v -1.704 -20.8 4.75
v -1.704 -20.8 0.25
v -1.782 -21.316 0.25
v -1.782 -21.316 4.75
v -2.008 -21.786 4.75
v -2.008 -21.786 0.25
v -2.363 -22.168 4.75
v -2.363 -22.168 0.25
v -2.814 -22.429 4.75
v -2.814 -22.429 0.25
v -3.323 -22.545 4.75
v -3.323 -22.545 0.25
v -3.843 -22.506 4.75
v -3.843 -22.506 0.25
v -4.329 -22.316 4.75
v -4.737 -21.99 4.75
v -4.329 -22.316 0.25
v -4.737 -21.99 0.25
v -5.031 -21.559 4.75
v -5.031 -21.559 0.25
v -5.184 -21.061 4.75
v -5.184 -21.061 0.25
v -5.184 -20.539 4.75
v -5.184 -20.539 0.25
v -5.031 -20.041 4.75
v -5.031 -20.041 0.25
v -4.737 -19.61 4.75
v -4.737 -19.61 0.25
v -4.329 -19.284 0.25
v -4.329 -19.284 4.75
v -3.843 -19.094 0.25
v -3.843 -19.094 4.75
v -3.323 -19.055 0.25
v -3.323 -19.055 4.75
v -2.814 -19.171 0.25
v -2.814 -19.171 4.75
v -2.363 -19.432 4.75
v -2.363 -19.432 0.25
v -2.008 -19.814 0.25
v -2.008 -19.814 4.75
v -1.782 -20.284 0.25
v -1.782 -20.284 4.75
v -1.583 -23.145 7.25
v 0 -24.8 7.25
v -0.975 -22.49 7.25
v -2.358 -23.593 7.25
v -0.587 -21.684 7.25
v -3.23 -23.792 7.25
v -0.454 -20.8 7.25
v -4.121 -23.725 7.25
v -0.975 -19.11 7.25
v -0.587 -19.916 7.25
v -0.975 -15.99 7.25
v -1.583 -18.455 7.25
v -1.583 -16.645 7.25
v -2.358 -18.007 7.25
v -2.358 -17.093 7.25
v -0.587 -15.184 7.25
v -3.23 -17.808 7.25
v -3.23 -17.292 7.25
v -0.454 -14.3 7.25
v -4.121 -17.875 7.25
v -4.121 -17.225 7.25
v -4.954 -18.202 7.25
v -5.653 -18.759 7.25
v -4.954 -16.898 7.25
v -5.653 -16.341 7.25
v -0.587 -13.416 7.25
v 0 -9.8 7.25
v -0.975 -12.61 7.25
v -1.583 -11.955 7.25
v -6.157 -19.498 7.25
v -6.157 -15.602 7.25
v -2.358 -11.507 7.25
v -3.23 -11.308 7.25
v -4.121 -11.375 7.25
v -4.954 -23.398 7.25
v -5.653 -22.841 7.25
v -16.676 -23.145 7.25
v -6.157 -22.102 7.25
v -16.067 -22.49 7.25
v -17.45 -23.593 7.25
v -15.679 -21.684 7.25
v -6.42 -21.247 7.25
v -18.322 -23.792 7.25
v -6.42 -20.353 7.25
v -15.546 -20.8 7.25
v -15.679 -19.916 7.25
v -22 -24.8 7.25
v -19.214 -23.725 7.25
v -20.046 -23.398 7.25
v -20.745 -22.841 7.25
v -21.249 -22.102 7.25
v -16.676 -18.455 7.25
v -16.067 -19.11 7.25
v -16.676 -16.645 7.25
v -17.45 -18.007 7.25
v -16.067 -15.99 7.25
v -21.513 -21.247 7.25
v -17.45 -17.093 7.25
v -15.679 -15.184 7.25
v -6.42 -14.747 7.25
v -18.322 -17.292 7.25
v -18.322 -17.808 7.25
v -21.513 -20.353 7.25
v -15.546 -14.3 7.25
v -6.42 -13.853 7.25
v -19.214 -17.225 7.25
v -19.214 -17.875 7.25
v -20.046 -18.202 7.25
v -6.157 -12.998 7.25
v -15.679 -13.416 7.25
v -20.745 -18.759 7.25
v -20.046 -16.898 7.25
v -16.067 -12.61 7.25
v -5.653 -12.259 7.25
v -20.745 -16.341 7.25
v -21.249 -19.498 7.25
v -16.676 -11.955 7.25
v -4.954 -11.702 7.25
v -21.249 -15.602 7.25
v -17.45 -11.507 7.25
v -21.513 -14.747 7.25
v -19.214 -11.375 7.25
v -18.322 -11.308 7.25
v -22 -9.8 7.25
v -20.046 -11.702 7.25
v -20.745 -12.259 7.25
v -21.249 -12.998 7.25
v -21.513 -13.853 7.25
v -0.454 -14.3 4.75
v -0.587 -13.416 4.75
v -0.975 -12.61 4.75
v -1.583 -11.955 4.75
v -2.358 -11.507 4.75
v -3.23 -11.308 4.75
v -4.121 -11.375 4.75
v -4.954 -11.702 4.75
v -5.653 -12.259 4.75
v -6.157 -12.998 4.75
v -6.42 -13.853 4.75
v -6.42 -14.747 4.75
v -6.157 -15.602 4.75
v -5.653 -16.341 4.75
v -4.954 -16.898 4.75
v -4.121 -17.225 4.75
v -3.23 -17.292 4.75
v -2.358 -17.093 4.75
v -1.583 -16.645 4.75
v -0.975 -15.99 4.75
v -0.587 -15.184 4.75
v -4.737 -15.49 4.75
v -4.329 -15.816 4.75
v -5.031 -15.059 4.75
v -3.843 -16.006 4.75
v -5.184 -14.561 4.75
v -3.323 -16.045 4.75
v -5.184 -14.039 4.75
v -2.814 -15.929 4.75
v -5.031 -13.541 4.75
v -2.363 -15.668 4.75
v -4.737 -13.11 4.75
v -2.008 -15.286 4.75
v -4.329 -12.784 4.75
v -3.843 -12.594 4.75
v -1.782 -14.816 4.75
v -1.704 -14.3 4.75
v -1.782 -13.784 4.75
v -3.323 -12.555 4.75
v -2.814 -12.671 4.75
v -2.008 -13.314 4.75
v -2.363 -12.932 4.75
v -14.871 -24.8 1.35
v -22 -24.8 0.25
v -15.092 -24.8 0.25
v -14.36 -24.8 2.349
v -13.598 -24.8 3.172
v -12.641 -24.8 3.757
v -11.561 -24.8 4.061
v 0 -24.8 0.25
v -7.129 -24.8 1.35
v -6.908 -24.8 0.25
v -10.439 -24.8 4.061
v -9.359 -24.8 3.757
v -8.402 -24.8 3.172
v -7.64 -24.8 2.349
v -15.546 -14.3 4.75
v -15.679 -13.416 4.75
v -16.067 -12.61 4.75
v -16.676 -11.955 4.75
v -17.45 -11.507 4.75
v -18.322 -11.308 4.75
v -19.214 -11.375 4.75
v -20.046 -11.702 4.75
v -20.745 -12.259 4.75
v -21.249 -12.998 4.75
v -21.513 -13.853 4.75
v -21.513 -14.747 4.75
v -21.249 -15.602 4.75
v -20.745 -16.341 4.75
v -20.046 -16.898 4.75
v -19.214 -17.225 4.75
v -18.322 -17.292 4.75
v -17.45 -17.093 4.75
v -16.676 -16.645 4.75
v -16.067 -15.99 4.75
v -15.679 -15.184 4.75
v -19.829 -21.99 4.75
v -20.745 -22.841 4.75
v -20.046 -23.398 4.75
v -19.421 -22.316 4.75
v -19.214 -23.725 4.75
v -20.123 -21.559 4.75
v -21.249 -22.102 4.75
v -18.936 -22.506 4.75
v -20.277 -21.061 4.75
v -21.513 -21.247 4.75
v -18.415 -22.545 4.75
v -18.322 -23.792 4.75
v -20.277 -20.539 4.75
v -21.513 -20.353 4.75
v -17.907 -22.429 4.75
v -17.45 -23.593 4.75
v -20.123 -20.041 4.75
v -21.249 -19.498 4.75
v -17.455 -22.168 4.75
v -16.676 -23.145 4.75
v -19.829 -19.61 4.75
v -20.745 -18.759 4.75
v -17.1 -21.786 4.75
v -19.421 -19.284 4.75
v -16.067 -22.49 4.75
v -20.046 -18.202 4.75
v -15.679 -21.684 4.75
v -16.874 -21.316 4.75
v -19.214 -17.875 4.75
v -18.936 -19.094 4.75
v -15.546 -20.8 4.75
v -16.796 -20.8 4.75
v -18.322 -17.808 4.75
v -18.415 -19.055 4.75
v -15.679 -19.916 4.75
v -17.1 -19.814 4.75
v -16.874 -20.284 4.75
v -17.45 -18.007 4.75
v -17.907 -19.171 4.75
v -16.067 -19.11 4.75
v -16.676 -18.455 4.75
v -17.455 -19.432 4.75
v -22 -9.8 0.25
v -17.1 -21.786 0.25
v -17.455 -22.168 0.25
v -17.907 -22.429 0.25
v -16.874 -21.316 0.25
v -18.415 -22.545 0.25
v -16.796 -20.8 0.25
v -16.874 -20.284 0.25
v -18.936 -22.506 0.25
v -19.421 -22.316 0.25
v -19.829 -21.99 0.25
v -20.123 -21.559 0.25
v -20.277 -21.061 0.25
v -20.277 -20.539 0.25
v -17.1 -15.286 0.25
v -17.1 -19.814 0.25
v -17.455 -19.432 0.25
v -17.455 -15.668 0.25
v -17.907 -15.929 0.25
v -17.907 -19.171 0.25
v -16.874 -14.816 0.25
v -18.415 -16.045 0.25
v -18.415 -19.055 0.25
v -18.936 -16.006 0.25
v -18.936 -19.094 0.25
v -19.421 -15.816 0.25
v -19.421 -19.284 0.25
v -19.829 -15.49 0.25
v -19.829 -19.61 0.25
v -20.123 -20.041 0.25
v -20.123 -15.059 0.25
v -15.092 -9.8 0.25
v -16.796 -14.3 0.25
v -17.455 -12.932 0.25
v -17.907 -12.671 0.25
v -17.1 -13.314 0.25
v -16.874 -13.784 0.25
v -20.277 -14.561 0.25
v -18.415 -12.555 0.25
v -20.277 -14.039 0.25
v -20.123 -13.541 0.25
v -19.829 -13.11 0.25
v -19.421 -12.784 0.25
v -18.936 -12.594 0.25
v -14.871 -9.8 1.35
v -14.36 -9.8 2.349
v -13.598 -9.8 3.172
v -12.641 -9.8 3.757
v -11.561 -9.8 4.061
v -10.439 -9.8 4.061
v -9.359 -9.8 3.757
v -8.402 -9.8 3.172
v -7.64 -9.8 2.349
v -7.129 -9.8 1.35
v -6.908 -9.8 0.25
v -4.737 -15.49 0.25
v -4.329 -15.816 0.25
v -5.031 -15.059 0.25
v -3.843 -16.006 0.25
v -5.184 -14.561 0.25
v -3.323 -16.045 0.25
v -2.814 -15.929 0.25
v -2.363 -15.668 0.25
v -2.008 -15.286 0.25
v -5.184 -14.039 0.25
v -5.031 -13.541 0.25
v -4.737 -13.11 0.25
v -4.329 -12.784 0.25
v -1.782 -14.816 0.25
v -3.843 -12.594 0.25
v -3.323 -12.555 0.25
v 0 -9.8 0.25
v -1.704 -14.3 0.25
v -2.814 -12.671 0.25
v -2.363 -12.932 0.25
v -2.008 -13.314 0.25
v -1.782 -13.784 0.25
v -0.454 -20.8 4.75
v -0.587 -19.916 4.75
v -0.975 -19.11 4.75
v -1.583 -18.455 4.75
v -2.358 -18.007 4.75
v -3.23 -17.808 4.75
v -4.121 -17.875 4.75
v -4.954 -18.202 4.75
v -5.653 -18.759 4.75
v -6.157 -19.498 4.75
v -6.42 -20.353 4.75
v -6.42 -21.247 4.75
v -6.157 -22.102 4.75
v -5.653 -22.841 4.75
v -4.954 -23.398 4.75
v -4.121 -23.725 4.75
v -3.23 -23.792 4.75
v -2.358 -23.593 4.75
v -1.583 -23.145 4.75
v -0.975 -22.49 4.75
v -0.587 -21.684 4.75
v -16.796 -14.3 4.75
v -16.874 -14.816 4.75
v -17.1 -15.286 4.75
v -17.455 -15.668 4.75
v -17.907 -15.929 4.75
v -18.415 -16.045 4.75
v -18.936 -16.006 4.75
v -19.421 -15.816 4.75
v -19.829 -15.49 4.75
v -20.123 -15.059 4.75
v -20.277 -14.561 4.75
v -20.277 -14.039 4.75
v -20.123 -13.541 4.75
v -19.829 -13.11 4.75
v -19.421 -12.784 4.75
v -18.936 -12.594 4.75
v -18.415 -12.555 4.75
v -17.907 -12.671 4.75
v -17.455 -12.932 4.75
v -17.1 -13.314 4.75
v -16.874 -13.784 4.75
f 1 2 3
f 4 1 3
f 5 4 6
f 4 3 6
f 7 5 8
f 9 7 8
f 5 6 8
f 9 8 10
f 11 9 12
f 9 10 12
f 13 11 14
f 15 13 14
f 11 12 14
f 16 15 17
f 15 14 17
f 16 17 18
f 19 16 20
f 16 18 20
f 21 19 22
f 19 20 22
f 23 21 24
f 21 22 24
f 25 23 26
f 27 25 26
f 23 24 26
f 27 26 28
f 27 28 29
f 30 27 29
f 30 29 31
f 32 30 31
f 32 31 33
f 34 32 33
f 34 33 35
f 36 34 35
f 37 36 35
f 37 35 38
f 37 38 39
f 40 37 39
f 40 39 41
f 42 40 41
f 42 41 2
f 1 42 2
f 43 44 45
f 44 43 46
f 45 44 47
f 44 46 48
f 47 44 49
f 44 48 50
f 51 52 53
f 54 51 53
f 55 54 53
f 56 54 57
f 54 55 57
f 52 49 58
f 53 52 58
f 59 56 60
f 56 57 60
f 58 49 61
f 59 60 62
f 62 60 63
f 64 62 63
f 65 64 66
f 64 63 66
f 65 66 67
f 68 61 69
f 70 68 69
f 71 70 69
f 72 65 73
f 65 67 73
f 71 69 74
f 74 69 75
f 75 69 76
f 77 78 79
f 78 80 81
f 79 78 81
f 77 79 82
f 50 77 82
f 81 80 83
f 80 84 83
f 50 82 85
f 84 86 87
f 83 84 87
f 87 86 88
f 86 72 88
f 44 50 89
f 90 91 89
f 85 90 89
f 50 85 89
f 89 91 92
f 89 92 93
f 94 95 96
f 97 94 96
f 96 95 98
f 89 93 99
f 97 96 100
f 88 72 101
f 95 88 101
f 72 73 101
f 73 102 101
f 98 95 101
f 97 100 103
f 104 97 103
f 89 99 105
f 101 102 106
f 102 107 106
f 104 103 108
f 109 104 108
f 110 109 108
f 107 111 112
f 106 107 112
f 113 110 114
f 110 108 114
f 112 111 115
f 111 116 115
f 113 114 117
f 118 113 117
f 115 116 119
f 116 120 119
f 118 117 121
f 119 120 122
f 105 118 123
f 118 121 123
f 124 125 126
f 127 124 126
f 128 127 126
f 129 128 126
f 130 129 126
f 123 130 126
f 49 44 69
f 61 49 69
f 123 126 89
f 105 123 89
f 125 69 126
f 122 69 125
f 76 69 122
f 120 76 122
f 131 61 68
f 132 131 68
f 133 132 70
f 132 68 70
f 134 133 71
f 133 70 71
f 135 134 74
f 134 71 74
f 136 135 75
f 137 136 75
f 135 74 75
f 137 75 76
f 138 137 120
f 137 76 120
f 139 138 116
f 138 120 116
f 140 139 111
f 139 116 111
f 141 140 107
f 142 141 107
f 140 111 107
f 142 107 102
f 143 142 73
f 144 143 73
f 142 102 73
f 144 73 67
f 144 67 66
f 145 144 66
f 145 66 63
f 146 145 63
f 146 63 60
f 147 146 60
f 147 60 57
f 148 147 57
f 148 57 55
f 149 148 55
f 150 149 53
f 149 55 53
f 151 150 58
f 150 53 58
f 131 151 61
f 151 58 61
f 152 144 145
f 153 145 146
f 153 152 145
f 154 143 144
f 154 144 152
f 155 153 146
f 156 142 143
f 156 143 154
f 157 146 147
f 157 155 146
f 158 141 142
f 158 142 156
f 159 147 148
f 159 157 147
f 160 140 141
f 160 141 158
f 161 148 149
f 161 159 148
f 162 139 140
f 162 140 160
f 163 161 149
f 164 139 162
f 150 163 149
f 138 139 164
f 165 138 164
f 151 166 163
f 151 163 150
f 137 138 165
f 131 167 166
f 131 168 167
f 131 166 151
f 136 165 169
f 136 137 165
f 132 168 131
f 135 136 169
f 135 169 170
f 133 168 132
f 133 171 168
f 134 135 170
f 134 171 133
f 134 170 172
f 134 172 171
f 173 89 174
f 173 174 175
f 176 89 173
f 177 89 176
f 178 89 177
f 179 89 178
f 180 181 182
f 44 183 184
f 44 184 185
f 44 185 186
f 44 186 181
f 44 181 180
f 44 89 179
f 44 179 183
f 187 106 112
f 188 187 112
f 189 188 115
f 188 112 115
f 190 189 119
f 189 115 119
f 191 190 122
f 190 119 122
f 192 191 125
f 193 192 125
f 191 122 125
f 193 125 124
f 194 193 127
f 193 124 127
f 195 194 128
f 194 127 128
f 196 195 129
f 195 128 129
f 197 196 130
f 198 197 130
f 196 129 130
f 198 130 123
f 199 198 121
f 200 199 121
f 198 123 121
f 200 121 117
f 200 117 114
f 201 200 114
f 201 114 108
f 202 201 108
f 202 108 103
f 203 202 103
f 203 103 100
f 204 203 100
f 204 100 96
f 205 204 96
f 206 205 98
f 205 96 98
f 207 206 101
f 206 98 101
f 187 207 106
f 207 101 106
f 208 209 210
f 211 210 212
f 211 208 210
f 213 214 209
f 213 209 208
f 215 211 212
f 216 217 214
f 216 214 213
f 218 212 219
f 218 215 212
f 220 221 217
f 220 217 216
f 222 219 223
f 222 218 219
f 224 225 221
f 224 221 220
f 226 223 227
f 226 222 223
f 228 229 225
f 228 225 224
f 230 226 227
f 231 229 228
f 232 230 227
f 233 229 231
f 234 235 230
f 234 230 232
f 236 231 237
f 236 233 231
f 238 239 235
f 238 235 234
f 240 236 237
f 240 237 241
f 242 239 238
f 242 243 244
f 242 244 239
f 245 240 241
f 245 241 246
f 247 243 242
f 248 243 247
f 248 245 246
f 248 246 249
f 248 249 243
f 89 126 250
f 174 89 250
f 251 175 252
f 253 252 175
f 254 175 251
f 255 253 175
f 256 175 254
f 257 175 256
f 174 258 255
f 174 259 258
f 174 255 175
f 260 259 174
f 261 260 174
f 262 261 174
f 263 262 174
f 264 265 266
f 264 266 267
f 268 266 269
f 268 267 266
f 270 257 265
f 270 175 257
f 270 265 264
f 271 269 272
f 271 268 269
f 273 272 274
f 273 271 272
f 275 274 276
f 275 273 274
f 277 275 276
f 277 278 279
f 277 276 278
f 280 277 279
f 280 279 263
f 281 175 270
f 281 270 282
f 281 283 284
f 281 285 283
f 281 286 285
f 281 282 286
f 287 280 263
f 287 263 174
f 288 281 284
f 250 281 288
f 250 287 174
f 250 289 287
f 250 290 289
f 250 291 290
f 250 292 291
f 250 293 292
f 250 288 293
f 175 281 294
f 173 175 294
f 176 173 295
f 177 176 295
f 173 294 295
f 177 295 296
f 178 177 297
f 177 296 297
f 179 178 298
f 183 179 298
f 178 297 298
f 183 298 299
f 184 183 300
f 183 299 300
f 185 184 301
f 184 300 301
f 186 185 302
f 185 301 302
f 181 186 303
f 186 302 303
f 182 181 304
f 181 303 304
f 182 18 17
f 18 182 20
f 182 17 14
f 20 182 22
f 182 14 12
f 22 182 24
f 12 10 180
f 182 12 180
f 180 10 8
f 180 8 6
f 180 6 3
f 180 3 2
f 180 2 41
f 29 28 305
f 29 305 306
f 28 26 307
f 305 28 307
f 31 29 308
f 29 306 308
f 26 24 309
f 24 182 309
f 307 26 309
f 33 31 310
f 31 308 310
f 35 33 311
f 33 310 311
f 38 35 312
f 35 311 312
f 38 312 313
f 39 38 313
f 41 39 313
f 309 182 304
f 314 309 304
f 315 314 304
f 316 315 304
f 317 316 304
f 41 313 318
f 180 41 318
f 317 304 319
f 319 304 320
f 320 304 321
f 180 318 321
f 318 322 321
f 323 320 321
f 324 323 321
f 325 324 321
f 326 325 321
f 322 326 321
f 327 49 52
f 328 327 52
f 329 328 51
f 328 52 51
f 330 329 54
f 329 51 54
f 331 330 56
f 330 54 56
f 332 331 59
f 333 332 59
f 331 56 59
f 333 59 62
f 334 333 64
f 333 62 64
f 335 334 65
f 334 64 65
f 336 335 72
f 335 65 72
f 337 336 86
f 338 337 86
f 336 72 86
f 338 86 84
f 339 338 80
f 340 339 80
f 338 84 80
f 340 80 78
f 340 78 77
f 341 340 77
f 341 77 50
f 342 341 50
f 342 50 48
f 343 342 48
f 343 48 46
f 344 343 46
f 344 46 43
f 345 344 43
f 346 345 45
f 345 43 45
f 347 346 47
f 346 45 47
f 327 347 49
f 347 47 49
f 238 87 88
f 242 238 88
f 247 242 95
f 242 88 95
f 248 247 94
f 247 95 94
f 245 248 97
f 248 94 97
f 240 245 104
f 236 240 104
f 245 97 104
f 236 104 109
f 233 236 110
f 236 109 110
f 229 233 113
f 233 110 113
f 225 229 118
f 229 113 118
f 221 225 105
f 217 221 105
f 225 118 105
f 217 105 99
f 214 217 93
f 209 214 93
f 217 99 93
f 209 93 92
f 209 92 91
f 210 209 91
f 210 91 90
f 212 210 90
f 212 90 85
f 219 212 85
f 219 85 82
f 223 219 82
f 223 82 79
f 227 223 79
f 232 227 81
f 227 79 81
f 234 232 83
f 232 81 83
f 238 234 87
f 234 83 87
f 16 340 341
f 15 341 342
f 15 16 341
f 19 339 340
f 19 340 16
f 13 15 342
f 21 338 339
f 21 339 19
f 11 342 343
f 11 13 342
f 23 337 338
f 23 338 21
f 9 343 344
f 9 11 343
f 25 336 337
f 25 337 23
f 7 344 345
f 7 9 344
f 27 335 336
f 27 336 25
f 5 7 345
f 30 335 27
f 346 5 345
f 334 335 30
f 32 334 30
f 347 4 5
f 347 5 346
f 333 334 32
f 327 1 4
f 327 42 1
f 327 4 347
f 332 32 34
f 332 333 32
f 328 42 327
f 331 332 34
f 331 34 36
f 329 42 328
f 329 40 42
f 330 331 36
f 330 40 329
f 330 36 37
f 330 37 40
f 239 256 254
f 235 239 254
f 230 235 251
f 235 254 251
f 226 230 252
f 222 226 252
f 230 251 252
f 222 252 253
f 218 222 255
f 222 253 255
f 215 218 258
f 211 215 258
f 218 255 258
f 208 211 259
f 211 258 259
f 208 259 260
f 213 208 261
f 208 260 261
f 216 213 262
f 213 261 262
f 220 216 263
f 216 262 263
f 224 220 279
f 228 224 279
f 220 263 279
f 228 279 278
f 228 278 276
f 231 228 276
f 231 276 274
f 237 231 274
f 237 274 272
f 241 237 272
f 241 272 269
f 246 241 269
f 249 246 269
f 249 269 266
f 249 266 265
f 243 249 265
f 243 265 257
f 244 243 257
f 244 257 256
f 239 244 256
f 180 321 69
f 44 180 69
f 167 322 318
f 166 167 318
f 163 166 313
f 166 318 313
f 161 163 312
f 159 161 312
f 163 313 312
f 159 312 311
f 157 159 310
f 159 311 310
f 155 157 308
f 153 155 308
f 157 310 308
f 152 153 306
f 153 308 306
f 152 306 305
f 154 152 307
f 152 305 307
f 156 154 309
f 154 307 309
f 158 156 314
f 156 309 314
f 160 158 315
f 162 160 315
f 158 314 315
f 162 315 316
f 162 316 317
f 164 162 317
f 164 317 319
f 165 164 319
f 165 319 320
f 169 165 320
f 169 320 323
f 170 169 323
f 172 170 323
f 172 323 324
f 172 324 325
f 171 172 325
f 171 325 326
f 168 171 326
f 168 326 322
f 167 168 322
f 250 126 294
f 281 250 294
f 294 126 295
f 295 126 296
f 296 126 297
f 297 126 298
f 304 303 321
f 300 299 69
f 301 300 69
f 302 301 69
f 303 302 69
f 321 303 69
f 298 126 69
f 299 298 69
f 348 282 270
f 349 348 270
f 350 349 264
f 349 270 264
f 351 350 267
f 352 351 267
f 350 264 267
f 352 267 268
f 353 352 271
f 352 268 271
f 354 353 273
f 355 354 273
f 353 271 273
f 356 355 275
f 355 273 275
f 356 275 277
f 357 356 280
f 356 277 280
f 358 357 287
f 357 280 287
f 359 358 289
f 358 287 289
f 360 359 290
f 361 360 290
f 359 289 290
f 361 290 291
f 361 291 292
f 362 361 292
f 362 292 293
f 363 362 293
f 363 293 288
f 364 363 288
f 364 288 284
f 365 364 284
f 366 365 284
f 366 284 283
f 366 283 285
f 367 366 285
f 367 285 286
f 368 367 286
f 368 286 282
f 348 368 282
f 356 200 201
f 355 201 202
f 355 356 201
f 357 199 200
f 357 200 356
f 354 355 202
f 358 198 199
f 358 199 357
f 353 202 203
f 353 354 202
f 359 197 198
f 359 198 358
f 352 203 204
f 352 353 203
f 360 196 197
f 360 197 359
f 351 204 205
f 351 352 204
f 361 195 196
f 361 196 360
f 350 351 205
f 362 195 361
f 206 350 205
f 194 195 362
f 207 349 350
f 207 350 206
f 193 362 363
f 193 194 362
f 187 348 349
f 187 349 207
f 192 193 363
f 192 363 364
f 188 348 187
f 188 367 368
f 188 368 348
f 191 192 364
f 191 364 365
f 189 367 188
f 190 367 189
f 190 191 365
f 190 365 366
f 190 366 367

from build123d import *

# Parameters (mm, degrees)
PAD008_DEPTH    = 15
SKETCH018_R     = 1.75
POCKET008_DEPTH = 7.001
SKETCH019_R     = 3
POCKET009_DEPTH = 2.5


with BuildPart() as part:
    # Sketch017 (on Face1 of ReferencePocket007) → Pad008 (new body)
    with BuildSketch(Plane(origin=(0, -9.8, 0), x_dir=(-1, 0, 0), z_dir=(0, 1, 0))):
        with BuildLine():
            ThreePointArc((15.0923709509, 0.25), (11, 4.1), (6.9076290491, 0.25))
            Line((6.9076290491, 0.25), (0, 0.25))
            Line((0, 0.25), (0, 7.25))
            Line((0, 7.25), (22, 7.25))
            Line((22, 7.25), (22, 0.25))
            Line((15.0923709509, 0.25), (22, 0.25))
        make_face()
    extrude(amount=-PAD008_DEPTH)

    # Sketch018 (on Face6 of Pad008) → Pocket008 (cut, through all)
    with BuildSketch(Plane(origin=(0, 0, 0.25), x_dir=(1, 0, 0), z_dir=(0, 0, -1))):
        with Locations((-18.5461854755, 14.3)):
            Circle(SKETCH018_R)
        with Locations((-18.5461854755, 20.8)):
            Circle(SKETCH018_R)
        with Locations((-3.4538145245, 20.8)):
            Circle(SKETCH018_R)
        with Locations((-3.4538145245, 14.3)):
            Circle(SKETCH018_R)
    extrude(amount=-POCKET008_DEPTH, mode=Mode.SUBTRACT)

    # Sketch019 (on Face12 of Pocket008) → Pocket009 (cut)
    with BuildSketch(Plane.XY.offset(7.25)):
        with Locations((-18.5461854755, -14.3)):
            Circle(SKETCH019_R)
        with Locations((-18.5461854755, -20.8)):
            Circle(SKETCH019_R)
        with Locations((-3.4538145245, -20.8)):
            Circle(SKETCH019_R)
        with Locations((-3.4538145245, -14.3)):
            Circle(SKETCH019_R)
    extrude(amount=-POCKET009_DEPTH, mode=Mode.SUBTRACT)


solid = part.part
